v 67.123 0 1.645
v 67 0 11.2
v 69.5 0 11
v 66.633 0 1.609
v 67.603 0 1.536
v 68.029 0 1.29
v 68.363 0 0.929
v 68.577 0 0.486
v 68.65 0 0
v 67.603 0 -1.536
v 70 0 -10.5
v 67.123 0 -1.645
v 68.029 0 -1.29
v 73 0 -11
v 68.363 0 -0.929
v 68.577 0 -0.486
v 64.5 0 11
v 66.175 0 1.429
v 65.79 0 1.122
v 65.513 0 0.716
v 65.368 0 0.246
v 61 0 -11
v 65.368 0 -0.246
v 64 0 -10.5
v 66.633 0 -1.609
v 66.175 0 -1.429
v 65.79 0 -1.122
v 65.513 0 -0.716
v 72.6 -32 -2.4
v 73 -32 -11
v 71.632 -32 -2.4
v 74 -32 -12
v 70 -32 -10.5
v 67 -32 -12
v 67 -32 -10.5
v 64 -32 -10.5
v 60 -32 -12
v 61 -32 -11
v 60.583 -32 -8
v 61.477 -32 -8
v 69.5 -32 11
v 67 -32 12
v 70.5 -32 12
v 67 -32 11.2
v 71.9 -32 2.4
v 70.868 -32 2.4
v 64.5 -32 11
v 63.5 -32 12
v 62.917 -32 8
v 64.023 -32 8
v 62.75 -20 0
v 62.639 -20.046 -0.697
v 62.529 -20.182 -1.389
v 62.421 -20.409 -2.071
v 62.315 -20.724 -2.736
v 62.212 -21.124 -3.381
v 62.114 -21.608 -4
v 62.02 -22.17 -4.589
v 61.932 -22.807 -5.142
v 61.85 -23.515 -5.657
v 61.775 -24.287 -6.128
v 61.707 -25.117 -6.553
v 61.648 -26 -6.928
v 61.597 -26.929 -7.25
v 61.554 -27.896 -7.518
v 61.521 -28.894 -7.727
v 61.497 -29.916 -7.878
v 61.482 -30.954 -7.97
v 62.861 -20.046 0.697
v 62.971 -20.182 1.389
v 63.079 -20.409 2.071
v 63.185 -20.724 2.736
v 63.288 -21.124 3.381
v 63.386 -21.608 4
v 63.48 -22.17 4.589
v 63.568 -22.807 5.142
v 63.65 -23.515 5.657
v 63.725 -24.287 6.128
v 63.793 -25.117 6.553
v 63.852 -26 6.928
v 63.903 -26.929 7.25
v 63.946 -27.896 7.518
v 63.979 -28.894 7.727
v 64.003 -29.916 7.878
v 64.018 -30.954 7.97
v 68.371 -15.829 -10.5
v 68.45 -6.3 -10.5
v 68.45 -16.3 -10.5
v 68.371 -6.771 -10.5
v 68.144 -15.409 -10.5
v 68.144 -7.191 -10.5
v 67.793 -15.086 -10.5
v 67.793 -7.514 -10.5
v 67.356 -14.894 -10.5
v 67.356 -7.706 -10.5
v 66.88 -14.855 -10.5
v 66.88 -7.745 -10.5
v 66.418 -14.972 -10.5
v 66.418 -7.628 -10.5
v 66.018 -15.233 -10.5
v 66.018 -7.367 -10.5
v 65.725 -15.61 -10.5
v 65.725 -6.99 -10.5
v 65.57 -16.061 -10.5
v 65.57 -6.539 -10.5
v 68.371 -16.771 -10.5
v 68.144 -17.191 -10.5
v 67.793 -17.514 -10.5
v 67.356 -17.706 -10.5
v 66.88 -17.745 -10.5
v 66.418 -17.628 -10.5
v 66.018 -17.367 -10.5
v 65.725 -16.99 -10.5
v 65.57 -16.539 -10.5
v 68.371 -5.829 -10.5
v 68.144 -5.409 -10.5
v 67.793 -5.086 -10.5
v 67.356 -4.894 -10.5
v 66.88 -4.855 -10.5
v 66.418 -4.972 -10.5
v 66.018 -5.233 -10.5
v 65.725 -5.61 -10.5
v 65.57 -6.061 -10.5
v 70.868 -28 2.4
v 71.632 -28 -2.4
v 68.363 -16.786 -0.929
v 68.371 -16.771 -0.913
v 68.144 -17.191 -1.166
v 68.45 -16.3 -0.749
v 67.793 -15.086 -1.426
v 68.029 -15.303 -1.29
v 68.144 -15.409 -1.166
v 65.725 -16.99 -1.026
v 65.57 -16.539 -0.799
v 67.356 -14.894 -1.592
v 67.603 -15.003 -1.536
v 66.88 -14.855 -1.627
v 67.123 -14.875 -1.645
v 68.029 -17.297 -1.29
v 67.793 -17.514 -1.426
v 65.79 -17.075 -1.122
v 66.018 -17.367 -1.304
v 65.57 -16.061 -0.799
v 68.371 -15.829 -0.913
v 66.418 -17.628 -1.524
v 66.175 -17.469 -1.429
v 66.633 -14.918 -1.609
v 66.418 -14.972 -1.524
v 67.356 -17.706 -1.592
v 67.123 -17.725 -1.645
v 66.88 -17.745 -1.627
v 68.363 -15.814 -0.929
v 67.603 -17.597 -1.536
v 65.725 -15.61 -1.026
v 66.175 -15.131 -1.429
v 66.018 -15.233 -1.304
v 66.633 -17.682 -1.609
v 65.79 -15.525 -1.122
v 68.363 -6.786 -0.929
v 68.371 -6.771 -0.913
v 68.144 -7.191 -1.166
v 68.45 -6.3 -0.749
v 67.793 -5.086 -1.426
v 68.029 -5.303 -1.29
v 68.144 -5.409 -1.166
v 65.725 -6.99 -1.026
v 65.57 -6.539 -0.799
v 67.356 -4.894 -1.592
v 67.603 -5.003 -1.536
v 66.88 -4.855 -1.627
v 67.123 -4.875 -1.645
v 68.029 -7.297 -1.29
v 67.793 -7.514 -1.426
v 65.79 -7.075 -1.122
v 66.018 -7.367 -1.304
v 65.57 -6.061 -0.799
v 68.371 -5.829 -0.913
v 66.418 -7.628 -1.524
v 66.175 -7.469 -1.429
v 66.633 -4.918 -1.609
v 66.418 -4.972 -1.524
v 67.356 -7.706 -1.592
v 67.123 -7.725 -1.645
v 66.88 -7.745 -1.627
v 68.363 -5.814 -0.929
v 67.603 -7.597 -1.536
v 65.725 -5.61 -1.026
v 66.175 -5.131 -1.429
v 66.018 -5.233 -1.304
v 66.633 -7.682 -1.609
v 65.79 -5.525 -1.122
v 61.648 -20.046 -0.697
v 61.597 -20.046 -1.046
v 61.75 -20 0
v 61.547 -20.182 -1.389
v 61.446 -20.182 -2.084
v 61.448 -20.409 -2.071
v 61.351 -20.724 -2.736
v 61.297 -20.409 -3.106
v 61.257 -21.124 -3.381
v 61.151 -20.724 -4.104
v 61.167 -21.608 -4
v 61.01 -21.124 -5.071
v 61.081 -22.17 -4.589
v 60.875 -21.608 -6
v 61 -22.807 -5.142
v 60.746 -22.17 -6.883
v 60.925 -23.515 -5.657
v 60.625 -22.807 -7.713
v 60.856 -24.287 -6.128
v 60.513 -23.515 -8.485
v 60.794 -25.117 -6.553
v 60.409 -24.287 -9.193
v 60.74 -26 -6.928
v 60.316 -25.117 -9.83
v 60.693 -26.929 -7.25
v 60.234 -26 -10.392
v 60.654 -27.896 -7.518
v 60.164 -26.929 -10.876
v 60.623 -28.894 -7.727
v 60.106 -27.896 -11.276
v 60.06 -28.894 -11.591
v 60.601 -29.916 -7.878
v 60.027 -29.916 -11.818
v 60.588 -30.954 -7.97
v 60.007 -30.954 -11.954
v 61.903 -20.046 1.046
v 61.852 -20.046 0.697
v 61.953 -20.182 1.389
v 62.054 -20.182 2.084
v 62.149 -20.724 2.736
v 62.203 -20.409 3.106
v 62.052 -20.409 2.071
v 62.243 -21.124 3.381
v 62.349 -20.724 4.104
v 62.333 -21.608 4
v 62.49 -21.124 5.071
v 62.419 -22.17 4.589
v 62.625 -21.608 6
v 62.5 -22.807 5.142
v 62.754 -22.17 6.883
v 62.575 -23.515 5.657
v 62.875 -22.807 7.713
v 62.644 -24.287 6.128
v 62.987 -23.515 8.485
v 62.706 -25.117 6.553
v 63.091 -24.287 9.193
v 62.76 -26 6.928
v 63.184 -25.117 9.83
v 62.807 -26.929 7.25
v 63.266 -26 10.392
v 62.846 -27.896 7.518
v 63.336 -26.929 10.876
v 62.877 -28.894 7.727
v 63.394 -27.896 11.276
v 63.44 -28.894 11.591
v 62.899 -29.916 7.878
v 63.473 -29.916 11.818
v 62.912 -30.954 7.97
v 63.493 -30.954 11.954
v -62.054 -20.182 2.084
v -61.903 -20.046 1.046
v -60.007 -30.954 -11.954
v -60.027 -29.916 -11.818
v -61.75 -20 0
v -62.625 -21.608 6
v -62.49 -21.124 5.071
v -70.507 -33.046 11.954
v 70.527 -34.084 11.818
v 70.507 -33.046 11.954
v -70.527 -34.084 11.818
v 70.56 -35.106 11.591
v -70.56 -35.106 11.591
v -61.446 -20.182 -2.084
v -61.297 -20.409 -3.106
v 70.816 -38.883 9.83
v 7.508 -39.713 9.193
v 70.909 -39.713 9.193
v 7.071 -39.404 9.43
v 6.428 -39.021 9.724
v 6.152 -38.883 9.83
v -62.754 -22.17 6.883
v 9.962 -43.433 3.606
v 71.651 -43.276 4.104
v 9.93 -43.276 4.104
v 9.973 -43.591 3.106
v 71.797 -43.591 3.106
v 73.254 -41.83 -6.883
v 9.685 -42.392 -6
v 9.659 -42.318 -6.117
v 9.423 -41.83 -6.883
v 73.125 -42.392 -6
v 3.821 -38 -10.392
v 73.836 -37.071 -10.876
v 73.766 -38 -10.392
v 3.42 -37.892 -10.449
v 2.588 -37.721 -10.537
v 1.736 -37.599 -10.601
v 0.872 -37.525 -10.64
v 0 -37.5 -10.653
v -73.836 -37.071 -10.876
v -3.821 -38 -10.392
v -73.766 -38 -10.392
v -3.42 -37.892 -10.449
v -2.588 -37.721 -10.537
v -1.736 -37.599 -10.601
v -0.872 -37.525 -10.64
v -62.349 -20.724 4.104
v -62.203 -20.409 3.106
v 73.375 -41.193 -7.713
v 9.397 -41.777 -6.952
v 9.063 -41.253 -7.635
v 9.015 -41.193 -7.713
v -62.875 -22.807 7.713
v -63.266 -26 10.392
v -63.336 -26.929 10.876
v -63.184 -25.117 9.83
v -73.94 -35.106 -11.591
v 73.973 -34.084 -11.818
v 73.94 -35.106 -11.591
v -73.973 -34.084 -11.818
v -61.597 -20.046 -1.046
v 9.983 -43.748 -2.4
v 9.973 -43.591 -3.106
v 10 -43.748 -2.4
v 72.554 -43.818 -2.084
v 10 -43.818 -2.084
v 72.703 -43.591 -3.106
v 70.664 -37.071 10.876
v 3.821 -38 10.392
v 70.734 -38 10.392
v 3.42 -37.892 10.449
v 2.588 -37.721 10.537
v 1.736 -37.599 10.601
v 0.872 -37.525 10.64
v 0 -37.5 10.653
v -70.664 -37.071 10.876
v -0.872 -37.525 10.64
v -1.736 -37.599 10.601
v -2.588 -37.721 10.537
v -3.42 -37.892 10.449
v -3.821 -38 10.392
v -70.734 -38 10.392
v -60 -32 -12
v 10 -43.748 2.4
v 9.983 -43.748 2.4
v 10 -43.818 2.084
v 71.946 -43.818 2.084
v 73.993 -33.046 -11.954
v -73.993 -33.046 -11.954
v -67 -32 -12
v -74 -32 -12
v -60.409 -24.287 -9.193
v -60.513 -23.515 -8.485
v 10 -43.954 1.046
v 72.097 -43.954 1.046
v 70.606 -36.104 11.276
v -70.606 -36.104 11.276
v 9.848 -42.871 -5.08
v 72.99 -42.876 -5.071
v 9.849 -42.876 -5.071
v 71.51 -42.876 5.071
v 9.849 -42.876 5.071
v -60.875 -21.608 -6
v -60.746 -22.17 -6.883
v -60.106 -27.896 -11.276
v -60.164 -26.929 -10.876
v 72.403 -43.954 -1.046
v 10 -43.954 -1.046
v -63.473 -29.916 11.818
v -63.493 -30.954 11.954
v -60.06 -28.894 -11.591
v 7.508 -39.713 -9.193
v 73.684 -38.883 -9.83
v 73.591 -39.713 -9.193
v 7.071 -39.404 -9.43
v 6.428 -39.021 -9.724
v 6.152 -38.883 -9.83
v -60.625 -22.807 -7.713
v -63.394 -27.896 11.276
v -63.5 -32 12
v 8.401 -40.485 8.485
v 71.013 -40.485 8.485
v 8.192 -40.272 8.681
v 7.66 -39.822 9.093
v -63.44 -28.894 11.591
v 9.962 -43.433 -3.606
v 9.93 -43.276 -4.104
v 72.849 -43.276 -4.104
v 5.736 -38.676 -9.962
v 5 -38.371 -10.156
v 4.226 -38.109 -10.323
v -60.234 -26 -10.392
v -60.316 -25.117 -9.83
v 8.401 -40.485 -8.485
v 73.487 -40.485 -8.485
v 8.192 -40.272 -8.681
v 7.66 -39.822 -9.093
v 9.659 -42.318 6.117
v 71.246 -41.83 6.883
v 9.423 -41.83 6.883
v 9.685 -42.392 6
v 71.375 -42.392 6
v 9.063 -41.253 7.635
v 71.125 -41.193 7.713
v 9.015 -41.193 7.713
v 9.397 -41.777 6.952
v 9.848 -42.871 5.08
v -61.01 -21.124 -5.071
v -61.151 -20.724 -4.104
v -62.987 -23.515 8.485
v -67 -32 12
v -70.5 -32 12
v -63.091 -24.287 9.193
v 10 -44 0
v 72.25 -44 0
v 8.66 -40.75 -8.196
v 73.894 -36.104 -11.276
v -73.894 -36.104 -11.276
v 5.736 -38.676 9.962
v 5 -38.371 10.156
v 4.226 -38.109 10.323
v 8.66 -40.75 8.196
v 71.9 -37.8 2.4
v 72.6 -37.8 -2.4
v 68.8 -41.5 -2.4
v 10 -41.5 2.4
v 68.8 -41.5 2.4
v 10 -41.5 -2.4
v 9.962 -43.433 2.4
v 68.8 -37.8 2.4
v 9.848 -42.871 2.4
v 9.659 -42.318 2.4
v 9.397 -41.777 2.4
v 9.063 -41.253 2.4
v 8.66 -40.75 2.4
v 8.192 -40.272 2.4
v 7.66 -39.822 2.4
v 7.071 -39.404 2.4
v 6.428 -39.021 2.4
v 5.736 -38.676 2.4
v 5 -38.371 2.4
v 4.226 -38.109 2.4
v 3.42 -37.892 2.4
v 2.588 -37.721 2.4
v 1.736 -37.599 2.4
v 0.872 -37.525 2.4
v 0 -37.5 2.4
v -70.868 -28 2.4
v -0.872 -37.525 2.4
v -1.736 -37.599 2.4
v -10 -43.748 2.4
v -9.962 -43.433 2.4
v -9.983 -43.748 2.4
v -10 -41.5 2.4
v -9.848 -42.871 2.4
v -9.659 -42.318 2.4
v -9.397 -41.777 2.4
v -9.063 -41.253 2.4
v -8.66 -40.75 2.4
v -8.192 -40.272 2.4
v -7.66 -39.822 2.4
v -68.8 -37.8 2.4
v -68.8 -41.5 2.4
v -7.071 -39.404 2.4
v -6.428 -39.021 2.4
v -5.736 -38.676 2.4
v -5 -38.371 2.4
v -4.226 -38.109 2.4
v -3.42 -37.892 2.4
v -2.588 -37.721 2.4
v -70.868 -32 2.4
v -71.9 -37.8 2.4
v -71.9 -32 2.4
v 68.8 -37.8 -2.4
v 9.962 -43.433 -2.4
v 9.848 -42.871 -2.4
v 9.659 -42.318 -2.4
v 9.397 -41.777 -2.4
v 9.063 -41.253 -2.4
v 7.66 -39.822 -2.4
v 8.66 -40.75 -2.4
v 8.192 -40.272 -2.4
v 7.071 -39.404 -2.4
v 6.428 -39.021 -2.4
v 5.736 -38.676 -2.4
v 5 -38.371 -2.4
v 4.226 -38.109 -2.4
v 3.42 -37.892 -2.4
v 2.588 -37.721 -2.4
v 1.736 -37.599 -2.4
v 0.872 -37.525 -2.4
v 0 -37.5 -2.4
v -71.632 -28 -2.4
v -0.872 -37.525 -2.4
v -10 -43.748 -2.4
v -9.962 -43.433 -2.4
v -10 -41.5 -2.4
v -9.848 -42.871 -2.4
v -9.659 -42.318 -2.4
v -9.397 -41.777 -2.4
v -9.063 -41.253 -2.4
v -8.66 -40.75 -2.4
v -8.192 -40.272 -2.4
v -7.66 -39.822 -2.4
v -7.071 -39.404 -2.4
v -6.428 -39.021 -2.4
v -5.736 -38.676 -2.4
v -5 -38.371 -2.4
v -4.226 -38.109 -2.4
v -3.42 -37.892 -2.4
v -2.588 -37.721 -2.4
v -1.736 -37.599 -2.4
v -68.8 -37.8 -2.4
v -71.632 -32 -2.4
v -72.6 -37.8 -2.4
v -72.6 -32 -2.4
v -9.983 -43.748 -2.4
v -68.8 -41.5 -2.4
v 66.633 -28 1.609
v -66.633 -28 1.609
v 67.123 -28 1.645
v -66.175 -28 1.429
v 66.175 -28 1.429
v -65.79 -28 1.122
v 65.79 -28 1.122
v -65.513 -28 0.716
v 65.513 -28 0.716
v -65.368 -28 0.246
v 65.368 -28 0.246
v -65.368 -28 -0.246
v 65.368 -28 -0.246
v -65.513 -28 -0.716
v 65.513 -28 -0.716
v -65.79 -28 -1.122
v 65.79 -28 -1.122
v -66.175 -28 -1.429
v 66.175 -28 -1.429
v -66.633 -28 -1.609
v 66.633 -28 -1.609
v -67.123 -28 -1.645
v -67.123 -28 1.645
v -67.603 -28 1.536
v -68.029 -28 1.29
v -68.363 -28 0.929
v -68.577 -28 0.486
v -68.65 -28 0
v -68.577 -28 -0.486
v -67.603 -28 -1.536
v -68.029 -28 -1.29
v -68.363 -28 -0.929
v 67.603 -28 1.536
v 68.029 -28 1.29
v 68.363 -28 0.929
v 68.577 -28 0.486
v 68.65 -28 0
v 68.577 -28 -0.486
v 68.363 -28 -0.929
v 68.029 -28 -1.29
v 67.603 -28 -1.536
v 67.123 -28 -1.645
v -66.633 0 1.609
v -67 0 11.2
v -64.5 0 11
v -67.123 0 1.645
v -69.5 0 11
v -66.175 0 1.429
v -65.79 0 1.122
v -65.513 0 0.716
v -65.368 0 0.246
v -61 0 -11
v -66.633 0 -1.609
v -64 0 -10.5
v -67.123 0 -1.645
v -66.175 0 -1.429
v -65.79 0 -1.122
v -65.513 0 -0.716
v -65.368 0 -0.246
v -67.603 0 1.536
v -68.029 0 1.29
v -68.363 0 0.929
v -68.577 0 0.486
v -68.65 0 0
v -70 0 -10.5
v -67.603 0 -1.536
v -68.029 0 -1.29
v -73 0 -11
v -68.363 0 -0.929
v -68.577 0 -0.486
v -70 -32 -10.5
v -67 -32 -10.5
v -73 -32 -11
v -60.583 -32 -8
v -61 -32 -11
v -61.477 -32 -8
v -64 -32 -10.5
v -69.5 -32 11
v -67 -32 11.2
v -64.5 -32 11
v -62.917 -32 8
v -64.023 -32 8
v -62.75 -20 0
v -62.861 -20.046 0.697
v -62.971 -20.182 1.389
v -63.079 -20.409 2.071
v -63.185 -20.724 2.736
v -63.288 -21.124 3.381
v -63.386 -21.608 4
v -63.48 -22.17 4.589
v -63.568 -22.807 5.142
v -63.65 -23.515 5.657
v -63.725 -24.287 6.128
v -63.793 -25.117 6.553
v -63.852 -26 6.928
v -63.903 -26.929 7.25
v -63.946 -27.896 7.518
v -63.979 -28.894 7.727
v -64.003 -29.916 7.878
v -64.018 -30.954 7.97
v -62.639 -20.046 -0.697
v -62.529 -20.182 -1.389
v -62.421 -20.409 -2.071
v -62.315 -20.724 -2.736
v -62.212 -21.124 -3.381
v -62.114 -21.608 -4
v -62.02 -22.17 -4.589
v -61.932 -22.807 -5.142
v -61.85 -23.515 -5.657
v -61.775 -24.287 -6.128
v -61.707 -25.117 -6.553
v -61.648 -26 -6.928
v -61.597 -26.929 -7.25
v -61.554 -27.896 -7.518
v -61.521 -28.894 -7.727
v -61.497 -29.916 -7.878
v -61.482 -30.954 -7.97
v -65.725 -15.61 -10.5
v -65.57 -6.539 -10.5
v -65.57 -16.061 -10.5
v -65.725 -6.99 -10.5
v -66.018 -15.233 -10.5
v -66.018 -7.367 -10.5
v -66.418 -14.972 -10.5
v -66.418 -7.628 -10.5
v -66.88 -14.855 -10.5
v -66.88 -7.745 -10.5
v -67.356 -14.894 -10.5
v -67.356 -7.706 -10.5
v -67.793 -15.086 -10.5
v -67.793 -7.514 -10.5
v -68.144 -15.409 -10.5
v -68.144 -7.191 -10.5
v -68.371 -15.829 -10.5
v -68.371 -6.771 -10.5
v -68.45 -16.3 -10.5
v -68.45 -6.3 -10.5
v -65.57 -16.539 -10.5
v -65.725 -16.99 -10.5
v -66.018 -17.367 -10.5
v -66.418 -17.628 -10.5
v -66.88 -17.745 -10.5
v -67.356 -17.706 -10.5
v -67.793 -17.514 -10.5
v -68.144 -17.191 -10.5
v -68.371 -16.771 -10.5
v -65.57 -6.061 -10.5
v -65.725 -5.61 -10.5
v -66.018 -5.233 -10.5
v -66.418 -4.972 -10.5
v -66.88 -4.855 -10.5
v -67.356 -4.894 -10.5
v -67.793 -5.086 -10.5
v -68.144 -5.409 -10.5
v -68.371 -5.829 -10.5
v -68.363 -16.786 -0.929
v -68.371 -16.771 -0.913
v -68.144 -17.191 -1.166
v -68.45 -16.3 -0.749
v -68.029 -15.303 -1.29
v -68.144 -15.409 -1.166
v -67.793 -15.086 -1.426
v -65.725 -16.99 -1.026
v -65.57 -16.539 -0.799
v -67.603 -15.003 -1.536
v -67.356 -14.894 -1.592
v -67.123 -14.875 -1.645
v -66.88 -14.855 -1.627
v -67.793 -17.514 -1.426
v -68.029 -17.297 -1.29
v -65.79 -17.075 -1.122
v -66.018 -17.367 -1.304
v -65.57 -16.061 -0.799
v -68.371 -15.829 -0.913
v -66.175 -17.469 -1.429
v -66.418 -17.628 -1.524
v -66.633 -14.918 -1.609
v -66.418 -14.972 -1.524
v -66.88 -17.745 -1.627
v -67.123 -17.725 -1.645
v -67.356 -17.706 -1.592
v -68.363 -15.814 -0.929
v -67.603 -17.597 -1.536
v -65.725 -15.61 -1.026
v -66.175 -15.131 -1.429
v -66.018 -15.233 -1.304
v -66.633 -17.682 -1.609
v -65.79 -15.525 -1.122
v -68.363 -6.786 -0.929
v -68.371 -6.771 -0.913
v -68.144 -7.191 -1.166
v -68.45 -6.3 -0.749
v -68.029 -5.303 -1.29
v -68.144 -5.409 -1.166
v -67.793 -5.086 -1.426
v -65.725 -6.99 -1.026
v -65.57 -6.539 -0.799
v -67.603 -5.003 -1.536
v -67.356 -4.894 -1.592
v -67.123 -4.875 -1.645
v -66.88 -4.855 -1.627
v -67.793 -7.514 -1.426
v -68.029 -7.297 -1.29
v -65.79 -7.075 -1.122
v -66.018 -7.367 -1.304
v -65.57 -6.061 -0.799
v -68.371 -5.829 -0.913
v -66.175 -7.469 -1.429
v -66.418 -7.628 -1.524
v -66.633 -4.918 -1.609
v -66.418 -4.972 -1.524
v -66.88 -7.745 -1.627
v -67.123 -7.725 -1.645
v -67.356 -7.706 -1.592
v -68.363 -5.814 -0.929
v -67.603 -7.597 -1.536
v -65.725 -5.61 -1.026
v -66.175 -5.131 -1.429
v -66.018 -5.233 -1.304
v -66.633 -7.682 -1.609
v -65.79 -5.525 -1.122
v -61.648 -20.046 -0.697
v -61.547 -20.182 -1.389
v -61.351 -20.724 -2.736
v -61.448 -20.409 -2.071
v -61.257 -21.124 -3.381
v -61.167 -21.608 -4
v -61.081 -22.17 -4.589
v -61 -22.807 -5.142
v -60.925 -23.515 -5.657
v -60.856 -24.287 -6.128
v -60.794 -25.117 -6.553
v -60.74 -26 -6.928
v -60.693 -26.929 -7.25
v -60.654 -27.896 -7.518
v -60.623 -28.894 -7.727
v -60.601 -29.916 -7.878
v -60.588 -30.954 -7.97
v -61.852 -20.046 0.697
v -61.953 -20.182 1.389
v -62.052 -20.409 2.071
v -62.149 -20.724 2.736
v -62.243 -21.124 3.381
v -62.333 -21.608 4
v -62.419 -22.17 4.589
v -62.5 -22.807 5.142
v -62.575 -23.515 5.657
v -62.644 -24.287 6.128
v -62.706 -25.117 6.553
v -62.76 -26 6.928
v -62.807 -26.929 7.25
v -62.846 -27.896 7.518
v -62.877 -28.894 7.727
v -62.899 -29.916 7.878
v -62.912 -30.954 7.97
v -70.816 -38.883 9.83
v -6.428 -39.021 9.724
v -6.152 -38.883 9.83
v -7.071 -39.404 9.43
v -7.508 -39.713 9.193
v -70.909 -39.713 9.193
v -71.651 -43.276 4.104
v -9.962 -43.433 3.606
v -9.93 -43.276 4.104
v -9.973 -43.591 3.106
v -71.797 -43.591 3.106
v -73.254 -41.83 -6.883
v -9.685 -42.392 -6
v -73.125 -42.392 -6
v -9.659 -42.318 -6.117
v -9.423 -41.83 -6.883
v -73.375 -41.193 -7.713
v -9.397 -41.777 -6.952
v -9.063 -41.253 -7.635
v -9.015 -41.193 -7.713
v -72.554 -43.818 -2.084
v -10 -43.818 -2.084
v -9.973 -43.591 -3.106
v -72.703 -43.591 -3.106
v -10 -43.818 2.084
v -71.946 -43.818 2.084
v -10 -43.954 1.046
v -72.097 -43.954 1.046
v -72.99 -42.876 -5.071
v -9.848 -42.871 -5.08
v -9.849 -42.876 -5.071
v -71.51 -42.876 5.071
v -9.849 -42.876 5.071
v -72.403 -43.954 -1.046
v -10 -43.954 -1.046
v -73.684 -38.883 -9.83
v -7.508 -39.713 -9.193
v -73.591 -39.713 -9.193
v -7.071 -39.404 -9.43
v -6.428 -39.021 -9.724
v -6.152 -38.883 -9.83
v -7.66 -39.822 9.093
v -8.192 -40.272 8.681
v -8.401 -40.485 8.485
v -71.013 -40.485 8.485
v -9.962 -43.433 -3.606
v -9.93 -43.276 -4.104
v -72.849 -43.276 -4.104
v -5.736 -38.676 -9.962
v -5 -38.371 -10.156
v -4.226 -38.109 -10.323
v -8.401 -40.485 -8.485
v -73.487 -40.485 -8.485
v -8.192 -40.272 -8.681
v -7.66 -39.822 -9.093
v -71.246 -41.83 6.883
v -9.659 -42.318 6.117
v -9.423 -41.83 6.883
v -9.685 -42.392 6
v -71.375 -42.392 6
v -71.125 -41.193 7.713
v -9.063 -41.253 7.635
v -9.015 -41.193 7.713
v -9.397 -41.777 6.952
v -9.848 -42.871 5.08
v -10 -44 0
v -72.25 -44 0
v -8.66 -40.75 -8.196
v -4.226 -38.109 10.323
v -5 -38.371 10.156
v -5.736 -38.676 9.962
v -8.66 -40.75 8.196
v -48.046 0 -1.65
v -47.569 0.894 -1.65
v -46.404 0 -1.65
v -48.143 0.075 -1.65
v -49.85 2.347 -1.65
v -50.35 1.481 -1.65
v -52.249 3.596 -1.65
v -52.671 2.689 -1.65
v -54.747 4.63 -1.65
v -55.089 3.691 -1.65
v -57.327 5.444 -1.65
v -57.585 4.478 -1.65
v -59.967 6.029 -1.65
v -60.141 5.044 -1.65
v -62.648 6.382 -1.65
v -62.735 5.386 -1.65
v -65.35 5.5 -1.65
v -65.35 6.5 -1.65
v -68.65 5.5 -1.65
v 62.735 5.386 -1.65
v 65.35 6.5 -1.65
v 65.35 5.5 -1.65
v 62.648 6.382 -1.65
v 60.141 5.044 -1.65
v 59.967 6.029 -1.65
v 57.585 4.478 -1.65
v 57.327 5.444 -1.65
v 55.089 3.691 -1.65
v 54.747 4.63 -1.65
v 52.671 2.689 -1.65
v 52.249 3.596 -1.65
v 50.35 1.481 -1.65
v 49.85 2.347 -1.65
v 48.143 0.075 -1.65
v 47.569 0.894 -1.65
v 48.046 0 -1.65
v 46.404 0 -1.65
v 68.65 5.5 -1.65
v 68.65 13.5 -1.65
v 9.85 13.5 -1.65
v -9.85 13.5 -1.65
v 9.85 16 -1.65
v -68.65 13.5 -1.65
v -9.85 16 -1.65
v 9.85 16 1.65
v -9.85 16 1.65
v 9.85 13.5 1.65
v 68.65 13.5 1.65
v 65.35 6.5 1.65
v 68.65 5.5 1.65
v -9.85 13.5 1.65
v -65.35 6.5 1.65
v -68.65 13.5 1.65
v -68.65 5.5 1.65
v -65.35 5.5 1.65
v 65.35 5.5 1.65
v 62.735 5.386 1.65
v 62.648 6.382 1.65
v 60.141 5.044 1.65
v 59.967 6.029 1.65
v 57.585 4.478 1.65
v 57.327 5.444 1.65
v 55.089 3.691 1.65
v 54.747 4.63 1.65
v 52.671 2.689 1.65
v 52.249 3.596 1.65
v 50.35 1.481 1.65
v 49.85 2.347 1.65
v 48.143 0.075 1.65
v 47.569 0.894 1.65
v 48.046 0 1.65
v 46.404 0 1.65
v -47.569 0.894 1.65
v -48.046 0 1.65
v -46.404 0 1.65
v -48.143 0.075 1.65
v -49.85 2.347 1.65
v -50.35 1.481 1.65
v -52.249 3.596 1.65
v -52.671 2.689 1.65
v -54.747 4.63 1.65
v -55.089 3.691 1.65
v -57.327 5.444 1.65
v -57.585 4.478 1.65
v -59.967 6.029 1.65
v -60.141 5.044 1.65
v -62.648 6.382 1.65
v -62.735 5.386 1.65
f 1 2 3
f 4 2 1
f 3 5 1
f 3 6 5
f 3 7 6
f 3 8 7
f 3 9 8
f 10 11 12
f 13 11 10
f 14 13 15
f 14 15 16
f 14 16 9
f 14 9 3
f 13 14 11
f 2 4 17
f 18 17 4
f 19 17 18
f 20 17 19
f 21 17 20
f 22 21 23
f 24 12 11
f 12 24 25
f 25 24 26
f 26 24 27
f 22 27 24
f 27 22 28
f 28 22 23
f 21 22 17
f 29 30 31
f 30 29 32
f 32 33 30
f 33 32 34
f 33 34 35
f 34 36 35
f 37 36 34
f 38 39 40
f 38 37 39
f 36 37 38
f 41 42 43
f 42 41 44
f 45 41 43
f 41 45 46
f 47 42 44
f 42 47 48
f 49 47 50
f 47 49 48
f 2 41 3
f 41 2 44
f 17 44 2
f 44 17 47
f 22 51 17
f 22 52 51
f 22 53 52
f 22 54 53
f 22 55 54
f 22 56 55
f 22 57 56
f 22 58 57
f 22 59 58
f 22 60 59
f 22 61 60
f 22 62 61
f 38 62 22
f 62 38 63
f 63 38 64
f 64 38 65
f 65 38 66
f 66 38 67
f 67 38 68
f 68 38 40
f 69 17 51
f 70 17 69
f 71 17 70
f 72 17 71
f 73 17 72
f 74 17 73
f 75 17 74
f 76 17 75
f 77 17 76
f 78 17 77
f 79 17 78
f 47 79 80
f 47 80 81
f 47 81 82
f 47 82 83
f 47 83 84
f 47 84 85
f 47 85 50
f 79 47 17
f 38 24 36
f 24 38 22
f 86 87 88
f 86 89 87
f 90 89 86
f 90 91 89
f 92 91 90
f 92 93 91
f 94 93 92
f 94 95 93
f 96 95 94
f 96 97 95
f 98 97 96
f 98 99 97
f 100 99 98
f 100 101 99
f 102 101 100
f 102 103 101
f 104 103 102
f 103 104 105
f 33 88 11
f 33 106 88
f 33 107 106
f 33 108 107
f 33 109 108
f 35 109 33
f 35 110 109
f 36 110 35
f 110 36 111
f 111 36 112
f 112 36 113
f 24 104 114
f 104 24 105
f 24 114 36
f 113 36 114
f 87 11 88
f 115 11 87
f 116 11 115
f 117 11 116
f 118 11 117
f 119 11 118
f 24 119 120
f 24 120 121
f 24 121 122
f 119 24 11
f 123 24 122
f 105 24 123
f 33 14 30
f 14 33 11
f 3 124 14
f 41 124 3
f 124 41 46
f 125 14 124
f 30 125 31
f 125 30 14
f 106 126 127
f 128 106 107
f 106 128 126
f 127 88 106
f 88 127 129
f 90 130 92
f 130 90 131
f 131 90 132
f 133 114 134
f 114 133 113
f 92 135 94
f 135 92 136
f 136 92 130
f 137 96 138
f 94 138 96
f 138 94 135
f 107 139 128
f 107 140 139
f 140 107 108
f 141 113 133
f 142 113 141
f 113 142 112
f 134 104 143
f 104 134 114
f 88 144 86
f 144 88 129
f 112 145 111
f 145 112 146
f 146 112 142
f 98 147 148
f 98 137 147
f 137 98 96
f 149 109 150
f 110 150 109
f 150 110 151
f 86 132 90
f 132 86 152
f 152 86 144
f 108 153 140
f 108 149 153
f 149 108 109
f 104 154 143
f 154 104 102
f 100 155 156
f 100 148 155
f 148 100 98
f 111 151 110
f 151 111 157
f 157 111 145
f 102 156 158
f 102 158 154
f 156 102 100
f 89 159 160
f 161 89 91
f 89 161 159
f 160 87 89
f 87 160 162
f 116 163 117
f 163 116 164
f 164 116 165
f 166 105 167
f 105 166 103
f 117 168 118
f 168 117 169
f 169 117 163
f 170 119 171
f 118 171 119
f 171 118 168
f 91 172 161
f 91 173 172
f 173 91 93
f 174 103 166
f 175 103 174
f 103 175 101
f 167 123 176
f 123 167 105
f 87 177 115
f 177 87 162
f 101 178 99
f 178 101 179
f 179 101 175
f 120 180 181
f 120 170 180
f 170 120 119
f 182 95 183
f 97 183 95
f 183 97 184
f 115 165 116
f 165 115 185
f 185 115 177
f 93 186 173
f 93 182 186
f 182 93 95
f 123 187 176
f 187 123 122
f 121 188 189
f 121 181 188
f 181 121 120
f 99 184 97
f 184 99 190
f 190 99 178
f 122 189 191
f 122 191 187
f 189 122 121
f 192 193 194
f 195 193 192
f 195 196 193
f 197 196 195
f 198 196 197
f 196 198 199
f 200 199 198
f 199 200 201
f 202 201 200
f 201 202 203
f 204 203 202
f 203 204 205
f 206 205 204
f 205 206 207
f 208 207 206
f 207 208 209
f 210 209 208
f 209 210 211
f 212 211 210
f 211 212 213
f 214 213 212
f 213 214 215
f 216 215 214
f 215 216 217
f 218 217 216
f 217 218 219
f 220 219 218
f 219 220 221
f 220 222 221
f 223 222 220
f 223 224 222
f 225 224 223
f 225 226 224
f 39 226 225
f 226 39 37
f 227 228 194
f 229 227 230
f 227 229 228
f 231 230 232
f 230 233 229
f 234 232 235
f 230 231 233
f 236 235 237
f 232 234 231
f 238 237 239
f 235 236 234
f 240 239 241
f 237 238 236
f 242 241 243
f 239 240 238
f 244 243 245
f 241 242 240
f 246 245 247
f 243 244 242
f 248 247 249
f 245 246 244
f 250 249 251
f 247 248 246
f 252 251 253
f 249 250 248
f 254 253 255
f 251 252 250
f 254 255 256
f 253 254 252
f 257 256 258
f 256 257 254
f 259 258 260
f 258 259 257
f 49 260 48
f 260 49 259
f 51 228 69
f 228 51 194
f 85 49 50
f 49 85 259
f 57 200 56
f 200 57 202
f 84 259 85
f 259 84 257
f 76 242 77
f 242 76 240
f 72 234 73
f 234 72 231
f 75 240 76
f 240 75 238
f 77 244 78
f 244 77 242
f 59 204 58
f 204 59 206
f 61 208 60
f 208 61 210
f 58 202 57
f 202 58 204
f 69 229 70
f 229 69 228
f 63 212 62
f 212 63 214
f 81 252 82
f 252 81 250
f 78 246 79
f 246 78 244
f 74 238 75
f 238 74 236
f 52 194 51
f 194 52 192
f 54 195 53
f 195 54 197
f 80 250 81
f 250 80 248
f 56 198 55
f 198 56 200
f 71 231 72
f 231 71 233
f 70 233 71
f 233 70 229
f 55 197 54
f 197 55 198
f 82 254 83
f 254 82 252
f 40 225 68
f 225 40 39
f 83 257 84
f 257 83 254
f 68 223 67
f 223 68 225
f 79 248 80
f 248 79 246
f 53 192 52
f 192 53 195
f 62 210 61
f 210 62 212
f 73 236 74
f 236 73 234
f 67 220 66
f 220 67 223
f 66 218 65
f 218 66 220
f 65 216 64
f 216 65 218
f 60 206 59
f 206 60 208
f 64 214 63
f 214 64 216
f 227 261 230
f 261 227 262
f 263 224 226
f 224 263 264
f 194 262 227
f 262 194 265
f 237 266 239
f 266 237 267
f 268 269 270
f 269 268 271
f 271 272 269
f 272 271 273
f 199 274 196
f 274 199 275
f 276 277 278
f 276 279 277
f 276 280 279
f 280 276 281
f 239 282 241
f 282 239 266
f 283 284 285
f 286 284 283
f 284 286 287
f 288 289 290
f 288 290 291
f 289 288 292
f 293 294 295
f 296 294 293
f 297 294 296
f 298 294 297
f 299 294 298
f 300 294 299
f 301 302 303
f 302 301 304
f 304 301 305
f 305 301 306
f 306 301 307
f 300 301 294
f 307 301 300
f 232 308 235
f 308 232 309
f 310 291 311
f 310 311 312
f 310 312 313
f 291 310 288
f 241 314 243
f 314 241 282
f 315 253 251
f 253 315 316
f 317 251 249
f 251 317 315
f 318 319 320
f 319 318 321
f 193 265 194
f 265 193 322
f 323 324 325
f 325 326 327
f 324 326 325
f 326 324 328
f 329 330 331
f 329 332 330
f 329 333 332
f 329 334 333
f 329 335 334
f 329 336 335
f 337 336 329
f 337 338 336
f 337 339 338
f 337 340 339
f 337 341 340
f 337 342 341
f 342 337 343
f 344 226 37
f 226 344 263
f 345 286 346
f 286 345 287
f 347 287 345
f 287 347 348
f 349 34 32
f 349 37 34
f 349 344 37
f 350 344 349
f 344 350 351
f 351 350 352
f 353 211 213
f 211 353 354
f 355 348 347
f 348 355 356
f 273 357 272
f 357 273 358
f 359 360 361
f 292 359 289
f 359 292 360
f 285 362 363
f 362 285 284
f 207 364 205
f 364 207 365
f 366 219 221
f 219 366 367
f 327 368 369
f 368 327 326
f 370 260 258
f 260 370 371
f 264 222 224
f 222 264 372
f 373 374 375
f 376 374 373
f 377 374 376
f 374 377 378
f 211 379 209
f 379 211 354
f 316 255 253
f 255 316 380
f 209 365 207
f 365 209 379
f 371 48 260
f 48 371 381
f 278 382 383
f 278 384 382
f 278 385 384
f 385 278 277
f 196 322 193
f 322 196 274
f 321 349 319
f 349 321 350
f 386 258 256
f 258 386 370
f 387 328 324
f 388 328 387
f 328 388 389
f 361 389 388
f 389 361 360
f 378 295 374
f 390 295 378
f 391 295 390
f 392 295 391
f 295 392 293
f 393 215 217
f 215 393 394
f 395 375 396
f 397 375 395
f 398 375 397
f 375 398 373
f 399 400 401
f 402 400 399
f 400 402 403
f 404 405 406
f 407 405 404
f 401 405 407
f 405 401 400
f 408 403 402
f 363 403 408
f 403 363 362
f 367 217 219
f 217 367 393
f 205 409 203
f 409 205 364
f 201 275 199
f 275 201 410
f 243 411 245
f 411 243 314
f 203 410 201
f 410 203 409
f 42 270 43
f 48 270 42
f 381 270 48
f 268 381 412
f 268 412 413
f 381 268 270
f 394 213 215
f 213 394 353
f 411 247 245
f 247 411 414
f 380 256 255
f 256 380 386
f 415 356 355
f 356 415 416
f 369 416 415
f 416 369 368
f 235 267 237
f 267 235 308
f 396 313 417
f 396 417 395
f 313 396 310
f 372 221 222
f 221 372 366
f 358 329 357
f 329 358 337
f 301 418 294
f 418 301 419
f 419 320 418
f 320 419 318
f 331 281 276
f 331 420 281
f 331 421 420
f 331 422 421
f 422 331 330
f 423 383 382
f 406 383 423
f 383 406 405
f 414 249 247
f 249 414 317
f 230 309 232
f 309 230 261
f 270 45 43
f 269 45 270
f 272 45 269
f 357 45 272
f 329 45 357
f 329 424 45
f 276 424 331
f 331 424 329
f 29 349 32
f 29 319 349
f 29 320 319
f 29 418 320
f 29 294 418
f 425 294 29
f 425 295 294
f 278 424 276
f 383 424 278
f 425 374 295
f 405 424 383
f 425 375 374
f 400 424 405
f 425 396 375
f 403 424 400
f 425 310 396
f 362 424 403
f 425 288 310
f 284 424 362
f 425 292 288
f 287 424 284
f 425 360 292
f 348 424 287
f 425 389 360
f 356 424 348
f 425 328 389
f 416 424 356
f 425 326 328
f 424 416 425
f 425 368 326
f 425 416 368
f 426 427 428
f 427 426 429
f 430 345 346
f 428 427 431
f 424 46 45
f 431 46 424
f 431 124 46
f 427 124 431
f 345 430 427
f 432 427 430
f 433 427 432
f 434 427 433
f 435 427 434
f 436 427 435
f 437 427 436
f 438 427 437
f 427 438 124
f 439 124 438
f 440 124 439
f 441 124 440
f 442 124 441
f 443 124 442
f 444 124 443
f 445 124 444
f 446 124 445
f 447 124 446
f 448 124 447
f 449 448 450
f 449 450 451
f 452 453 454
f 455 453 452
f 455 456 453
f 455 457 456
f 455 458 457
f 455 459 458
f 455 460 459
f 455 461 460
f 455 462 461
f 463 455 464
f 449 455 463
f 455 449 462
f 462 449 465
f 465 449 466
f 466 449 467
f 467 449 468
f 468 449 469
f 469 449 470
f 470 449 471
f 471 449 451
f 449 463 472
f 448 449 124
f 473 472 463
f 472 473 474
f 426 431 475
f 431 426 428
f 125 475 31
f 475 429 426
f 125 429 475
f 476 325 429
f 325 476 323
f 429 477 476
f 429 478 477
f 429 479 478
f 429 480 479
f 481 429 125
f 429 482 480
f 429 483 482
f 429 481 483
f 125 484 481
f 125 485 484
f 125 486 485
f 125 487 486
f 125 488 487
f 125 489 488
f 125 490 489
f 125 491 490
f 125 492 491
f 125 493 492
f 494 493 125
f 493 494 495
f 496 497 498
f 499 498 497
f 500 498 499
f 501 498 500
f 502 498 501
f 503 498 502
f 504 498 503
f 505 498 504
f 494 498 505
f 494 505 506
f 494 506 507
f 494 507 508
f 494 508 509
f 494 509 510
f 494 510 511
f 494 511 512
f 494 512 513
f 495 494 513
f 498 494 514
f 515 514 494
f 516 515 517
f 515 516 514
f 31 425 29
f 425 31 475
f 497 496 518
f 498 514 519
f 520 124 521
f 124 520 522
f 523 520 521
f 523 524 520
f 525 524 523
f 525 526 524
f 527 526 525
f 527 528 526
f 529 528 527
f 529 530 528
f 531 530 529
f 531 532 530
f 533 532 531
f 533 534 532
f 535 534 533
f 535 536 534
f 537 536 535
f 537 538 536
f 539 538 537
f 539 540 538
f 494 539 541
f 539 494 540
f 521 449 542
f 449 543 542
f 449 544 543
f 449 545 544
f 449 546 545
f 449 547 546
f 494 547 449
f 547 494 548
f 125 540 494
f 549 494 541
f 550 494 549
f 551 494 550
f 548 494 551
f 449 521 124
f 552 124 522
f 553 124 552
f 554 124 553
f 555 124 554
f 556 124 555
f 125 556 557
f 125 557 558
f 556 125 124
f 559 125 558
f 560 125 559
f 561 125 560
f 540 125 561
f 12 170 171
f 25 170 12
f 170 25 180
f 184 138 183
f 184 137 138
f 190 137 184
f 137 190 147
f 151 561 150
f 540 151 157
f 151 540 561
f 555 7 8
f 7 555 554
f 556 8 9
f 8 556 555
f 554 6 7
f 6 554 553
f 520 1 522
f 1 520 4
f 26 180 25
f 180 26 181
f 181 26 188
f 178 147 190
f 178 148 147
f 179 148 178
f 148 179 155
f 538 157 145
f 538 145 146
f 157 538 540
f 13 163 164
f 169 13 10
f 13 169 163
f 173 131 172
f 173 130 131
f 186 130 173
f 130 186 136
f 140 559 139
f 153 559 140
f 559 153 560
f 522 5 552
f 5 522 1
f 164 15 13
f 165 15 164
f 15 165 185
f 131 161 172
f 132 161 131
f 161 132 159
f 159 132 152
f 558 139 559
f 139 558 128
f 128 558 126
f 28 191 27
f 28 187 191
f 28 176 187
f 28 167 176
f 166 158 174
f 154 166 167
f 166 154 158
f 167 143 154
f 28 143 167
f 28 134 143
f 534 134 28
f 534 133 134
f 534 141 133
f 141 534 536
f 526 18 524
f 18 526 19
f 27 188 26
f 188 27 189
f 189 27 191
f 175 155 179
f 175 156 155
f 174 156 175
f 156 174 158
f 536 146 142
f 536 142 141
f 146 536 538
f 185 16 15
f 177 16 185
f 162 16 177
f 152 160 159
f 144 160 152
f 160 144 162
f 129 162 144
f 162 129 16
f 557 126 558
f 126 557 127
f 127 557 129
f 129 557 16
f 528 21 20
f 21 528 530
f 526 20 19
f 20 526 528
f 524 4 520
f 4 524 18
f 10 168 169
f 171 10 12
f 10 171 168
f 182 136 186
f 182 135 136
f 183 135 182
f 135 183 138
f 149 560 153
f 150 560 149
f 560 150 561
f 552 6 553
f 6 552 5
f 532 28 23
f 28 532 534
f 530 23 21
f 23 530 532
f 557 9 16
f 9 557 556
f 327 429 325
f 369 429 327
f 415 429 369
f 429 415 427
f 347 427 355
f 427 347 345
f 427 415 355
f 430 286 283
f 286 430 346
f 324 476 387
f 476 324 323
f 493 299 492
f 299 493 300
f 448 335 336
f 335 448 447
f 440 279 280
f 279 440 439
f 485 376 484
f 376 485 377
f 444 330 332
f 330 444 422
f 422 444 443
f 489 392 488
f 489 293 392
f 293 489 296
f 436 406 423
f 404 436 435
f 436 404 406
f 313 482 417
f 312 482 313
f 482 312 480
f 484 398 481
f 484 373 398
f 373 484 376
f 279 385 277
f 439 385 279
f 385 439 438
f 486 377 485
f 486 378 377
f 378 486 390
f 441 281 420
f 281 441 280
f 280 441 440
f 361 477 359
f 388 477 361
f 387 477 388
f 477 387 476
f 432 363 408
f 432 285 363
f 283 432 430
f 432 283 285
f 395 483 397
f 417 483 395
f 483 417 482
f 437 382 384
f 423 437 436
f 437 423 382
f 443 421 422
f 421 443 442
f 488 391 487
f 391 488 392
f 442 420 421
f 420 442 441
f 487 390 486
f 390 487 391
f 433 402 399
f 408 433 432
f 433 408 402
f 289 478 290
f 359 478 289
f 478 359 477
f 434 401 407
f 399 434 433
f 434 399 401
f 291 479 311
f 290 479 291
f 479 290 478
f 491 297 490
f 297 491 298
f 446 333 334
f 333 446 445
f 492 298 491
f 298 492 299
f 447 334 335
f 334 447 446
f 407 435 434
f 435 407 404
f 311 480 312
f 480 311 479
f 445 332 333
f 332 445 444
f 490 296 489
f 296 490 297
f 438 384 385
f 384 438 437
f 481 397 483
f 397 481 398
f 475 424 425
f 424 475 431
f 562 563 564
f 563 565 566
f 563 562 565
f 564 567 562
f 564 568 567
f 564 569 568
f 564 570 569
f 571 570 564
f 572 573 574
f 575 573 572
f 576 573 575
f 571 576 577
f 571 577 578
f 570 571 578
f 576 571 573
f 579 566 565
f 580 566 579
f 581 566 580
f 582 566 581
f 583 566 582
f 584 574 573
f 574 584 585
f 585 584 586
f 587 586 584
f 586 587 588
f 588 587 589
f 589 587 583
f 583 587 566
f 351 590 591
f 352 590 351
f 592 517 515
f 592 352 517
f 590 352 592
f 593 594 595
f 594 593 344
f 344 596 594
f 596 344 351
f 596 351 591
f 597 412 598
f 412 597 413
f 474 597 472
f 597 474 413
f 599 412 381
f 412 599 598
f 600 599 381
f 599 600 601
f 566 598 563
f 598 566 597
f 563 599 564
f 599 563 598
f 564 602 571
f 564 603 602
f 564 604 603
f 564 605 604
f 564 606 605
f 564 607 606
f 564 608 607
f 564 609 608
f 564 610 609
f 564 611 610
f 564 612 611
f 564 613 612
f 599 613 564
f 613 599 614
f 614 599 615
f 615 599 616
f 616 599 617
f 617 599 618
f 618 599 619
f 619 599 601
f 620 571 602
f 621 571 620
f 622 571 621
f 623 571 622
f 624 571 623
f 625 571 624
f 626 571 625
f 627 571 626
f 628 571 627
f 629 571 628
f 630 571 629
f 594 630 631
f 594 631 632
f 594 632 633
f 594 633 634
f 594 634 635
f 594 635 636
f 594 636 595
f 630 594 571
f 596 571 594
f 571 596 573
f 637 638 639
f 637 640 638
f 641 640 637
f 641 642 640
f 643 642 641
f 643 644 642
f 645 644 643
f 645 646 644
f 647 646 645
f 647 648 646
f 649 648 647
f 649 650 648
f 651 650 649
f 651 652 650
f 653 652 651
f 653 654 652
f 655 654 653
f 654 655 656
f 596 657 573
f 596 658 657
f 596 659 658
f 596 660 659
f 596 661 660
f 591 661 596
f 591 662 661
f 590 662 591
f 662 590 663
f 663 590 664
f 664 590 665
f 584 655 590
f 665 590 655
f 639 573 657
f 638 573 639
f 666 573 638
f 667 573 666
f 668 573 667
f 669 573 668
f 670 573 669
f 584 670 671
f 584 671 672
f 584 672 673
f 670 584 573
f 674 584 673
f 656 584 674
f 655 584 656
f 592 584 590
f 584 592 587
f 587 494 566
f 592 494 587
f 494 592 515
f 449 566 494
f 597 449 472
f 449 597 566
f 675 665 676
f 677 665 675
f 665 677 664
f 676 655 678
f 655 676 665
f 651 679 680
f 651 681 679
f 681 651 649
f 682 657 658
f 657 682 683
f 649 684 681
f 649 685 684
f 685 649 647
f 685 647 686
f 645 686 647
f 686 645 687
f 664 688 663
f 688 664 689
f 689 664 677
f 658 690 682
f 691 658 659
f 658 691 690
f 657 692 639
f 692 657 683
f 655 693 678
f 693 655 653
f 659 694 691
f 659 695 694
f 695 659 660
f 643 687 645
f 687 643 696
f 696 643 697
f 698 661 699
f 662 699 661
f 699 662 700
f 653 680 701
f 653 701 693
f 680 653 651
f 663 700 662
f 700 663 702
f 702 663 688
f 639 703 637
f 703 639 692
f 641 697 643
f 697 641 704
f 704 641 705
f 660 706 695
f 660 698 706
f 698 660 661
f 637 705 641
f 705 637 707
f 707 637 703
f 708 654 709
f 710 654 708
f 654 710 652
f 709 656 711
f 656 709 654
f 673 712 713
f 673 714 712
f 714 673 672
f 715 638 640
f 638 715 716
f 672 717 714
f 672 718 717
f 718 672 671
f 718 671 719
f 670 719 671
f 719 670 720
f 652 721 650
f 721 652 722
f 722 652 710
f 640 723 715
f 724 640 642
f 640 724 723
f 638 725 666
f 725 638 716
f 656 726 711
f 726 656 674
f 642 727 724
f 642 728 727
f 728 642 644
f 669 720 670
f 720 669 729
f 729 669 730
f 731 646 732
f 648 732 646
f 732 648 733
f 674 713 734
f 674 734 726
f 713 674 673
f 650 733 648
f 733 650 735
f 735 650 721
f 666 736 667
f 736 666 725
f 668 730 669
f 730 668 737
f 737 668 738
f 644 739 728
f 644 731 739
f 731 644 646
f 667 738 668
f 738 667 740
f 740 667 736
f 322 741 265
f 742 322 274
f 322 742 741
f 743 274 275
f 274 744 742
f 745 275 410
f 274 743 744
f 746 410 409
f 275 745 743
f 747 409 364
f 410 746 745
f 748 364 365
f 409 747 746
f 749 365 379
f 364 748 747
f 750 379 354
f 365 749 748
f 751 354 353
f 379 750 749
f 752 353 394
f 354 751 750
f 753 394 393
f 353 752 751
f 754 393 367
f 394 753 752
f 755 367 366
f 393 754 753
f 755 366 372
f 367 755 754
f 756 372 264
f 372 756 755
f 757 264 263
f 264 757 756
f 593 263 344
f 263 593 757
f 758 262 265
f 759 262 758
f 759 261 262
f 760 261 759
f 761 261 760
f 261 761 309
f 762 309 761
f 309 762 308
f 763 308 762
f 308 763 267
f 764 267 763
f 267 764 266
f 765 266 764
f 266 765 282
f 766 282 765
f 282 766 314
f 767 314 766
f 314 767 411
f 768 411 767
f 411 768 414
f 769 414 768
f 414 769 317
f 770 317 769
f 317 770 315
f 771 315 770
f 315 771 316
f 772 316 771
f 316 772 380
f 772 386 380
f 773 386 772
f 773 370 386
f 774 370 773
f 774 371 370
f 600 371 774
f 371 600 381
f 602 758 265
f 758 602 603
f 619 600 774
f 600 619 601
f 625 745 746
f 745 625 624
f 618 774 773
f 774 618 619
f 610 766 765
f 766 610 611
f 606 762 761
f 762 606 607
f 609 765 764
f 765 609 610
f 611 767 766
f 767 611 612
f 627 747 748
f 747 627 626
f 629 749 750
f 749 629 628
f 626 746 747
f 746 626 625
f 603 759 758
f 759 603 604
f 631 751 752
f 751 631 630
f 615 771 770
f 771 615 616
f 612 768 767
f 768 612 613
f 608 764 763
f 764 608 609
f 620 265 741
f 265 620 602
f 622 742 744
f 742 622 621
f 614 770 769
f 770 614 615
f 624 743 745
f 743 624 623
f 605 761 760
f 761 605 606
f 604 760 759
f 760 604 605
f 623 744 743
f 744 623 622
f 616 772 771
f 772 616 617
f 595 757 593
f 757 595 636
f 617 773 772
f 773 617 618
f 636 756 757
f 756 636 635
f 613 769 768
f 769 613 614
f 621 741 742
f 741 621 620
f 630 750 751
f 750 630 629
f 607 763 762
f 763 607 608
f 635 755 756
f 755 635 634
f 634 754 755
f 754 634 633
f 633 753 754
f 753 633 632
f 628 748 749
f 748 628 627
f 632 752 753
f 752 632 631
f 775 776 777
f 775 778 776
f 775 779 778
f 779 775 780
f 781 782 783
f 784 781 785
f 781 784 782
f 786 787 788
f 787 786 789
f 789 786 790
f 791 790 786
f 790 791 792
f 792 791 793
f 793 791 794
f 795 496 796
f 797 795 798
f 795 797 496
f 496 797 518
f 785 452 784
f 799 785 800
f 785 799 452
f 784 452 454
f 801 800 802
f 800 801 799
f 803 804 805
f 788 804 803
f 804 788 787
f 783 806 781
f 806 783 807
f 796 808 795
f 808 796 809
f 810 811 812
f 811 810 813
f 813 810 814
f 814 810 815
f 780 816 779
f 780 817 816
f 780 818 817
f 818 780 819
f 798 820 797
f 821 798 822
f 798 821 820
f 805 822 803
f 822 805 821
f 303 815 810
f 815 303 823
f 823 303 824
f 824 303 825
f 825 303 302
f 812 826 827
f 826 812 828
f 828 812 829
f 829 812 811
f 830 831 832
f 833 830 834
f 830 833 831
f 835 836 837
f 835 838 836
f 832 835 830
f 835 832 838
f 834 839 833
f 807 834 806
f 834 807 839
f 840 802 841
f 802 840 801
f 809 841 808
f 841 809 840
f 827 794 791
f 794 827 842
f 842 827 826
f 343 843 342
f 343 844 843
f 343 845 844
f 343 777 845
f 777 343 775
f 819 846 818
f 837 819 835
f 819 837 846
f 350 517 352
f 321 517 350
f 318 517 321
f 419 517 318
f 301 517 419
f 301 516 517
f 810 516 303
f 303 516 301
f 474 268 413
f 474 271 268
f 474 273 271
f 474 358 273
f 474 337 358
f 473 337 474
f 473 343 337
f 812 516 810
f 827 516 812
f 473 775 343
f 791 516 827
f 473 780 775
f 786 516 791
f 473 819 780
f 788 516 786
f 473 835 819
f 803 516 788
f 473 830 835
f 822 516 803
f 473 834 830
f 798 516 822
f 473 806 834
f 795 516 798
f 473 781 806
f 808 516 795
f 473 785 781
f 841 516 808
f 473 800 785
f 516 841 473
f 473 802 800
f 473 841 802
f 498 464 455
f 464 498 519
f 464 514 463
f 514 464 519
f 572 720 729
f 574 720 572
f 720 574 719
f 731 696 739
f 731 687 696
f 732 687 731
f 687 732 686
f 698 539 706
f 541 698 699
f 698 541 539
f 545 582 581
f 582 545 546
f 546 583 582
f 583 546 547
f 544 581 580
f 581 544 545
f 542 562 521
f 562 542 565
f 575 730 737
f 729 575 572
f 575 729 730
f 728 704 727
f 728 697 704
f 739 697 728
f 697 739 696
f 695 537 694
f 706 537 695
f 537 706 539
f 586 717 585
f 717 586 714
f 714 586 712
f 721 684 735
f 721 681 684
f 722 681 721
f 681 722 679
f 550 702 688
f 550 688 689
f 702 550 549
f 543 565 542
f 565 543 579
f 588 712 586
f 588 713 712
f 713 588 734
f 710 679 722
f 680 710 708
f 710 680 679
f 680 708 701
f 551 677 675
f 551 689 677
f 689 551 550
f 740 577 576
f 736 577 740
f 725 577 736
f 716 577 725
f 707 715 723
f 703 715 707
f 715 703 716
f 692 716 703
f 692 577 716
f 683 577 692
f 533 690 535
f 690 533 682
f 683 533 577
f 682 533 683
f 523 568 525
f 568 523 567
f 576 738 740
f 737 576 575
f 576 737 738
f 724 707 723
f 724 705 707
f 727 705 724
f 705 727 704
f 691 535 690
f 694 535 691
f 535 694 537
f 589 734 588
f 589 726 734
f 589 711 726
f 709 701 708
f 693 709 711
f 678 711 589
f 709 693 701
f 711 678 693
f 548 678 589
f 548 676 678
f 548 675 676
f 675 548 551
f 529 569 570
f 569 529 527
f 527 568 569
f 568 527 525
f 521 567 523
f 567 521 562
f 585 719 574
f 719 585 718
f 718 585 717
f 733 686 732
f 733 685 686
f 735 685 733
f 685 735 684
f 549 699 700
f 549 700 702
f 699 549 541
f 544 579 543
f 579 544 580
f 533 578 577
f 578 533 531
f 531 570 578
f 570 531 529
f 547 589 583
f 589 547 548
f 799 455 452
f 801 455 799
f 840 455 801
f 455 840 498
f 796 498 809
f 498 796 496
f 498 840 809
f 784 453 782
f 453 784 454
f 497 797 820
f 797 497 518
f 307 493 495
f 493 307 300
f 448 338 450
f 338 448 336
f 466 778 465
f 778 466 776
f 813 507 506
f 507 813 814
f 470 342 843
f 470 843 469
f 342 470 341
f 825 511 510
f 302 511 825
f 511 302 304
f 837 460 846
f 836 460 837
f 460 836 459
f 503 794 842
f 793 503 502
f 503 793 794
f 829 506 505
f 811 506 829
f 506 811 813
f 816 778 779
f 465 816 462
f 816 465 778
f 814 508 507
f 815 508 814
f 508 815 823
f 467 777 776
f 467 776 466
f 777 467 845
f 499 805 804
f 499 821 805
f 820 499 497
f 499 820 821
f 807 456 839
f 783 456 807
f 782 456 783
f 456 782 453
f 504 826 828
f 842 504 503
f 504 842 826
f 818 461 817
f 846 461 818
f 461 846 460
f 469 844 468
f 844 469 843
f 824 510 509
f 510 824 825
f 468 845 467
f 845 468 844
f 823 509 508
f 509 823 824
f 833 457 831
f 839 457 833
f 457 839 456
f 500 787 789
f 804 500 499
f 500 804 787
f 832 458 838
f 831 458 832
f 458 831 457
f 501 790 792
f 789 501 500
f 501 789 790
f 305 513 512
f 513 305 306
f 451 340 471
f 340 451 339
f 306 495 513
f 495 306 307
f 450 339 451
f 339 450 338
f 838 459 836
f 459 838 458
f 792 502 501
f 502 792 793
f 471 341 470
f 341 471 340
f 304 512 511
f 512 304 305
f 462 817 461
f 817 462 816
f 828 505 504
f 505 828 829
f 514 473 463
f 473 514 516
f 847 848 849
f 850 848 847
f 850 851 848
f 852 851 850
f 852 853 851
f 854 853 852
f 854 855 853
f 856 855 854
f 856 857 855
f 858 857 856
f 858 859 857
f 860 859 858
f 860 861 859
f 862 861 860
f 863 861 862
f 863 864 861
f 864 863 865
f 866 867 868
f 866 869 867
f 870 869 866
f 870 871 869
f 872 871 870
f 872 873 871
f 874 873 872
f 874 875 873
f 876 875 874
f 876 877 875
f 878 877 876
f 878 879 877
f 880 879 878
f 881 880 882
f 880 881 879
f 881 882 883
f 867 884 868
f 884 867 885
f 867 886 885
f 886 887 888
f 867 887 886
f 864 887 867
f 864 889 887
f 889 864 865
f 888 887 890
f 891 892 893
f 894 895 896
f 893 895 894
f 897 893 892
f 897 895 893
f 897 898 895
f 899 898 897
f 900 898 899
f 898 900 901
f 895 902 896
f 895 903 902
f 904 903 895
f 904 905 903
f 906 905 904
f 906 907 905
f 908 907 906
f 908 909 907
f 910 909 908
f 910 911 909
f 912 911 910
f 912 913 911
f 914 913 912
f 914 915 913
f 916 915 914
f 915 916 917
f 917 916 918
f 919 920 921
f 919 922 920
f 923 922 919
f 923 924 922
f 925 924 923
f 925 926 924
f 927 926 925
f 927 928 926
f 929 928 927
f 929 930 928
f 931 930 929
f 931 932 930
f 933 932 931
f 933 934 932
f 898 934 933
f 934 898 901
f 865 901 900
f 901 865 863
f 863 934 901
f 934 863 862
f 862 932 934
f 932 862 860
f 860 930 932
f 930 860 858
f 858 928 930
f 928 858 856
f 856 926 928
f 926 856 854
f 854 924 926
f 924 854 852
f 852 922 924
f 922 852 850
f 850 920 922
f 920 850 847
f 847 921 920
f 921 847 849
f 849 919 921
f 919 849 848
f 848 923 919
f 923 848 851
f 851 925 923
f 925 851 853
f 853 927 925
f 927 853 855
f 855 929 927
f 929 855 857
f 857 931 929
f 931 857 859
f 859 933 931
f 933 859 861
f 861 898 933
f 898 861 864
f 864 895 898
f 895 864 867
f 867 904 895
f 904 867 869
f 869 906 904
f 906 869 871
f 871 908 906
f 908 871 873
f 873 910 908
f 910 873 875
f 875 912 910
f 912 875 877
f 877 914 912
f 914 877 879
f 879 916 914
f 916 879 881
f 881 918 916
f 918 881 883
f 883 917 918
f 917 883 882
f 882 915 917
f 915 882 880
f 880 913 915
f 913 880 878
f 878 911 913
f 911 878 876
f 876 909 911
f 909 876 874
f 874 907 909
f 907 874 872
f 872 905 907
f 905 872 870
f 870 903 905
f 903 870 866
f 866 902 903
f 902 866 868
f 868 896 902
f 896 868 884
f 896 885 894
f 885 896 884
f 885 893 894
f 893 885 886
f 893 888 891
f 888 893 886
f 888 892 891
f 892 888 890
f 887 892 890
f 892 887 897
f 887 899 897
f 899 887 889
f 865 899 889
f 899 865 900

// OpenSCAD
$fa=5;$fs=.5;

print=true;

d=134;

w1=12;
w2=5;
h=22;
zh=32;
t=1;

hole1=zh-15.7;
hole2=zh-25.7;

notch_d=16;
notch_zr=12;

pind=3.3;
pinz_up=33.5;
pinz_down=28;
pin_travel=pinz_up-pinz_down;
btnw=20;

pinplate_h=8;
gap=.3;
gapoh=1.5;

spring_t=1;
spring_r=30;


module pipebb(){
	difference(){
	linear_extrude(zh)polygon([
			[-w1/2-t,-h/2-t],
			[w1/2+t,-h/2-t],
			[w2/2+t,h/2+t],
			[-w2/2-t,h/2+t]
		]);
		translate([0,0,zh])rotate([0,90,180])linear_extrude(w1/2+t)scale([2*notch_zr/notch_d,1])circle(d=notch_d);
	}
}
module joiner(){
	difference(){
		linear_extrude(zh)polygon([
			[-w1/2,-h/2],
			[-w1/4,-h/2+.5],
			[w1/4,-h/2+.5],
			[w1/2,-h/2],
			[w2/2,h/2],
			[0,h/2+.2],
			[-w2/2,h/2]
		]);
		translate([0,0,hole1])rotate([90,0,0])cylinder(d=2.9,h=h/2);
		translate([0,0,hole2])rotate([90,0,0])cylinder(d=2.9,h=h/2);
	}
}

module half(inv){
	difference(){
		union(){
			translate([d/2,0,0])joiner();
			//grip
			difference(){
				translate([0,0,zh])rotate([0,90,0])linear_extrude(d/2)circle(d=h+t*2);
				translate([d/2,0,0])pipebb();
			}
			//grip cap
			intersection(){
				translate([d/2,0,zh])rotate([0,90,0])linear_extrude(w1/2+t){
					circle(d=h+t*2);
				}
				translate([d/2,0,zh])pipebb();
			}
		}
		//pinhole
		translate([d/2,0,0])cylinder(d=pind,h=pinz_up);
		//btn key
		translate([0,0,zh])linear_extrude(h/2+t)square([btnw,pind+gapoh],center=true);
		//btn notch
		translate([0,0,zh+h/2+t])rotate([90,0,0])linear_extrude(h+t*2,center=true)scale([1,2*(pin_travel+1)/btnw])circle(d=btnw);
		
		translate([0,0,pinz_up]){
			linear_extrude(pinplate_h)square([d+pind+gap,pind+gapoh],center=true);
			scale([1,1,-1])linear_extrude(pin_travel)square([d+pind+gap,pind+gapoh],center=true);
		}
		//insert window
		//if(!inv)
		translate([0,0,pinz_down]){
			linear_extrude(zh+h/2+t-pinz_up-spring_t+gap)square([d*2,pind+gapoh],center=true);
		}
	}
}

module main(){
	difference(){
		half();
		if(!print)cube(d);
	}
	scale([-1,1,1])half(1);
}

module pinplate_half(){
	difference(){
		square([(d+pind)/2,pinplate_h]);
		square([(d-pind)/2,spring_t]);
	}
	intersection(){
		translate([0,spring_t])scale([1,-1])square([(d-pind)/2,pin_travel+spring_t]);
		translate([(d-pind)/2,-spring_r])difference(){
			circle(r=spring_r+spring_t);
			circle(r=spring_r);
		}
	}
}
module pinplate(){
	linear_extrude(pind,center=true){
		pinplate_half();scale([-1,1])pinplate_half();
		translate([-(btnw-gap)/2,pinplate_h])square([btnw-gap,zh+h/2+t-pinz_up-pinplate_h]);
	}

}

if(print){
	rotate([90,0,0])main();
	translate([0,pin_travel,0])pinplate();
}else{
	main();
	translate([0,0,pinz_up])rotate([90,0,0])pinplate();
}
